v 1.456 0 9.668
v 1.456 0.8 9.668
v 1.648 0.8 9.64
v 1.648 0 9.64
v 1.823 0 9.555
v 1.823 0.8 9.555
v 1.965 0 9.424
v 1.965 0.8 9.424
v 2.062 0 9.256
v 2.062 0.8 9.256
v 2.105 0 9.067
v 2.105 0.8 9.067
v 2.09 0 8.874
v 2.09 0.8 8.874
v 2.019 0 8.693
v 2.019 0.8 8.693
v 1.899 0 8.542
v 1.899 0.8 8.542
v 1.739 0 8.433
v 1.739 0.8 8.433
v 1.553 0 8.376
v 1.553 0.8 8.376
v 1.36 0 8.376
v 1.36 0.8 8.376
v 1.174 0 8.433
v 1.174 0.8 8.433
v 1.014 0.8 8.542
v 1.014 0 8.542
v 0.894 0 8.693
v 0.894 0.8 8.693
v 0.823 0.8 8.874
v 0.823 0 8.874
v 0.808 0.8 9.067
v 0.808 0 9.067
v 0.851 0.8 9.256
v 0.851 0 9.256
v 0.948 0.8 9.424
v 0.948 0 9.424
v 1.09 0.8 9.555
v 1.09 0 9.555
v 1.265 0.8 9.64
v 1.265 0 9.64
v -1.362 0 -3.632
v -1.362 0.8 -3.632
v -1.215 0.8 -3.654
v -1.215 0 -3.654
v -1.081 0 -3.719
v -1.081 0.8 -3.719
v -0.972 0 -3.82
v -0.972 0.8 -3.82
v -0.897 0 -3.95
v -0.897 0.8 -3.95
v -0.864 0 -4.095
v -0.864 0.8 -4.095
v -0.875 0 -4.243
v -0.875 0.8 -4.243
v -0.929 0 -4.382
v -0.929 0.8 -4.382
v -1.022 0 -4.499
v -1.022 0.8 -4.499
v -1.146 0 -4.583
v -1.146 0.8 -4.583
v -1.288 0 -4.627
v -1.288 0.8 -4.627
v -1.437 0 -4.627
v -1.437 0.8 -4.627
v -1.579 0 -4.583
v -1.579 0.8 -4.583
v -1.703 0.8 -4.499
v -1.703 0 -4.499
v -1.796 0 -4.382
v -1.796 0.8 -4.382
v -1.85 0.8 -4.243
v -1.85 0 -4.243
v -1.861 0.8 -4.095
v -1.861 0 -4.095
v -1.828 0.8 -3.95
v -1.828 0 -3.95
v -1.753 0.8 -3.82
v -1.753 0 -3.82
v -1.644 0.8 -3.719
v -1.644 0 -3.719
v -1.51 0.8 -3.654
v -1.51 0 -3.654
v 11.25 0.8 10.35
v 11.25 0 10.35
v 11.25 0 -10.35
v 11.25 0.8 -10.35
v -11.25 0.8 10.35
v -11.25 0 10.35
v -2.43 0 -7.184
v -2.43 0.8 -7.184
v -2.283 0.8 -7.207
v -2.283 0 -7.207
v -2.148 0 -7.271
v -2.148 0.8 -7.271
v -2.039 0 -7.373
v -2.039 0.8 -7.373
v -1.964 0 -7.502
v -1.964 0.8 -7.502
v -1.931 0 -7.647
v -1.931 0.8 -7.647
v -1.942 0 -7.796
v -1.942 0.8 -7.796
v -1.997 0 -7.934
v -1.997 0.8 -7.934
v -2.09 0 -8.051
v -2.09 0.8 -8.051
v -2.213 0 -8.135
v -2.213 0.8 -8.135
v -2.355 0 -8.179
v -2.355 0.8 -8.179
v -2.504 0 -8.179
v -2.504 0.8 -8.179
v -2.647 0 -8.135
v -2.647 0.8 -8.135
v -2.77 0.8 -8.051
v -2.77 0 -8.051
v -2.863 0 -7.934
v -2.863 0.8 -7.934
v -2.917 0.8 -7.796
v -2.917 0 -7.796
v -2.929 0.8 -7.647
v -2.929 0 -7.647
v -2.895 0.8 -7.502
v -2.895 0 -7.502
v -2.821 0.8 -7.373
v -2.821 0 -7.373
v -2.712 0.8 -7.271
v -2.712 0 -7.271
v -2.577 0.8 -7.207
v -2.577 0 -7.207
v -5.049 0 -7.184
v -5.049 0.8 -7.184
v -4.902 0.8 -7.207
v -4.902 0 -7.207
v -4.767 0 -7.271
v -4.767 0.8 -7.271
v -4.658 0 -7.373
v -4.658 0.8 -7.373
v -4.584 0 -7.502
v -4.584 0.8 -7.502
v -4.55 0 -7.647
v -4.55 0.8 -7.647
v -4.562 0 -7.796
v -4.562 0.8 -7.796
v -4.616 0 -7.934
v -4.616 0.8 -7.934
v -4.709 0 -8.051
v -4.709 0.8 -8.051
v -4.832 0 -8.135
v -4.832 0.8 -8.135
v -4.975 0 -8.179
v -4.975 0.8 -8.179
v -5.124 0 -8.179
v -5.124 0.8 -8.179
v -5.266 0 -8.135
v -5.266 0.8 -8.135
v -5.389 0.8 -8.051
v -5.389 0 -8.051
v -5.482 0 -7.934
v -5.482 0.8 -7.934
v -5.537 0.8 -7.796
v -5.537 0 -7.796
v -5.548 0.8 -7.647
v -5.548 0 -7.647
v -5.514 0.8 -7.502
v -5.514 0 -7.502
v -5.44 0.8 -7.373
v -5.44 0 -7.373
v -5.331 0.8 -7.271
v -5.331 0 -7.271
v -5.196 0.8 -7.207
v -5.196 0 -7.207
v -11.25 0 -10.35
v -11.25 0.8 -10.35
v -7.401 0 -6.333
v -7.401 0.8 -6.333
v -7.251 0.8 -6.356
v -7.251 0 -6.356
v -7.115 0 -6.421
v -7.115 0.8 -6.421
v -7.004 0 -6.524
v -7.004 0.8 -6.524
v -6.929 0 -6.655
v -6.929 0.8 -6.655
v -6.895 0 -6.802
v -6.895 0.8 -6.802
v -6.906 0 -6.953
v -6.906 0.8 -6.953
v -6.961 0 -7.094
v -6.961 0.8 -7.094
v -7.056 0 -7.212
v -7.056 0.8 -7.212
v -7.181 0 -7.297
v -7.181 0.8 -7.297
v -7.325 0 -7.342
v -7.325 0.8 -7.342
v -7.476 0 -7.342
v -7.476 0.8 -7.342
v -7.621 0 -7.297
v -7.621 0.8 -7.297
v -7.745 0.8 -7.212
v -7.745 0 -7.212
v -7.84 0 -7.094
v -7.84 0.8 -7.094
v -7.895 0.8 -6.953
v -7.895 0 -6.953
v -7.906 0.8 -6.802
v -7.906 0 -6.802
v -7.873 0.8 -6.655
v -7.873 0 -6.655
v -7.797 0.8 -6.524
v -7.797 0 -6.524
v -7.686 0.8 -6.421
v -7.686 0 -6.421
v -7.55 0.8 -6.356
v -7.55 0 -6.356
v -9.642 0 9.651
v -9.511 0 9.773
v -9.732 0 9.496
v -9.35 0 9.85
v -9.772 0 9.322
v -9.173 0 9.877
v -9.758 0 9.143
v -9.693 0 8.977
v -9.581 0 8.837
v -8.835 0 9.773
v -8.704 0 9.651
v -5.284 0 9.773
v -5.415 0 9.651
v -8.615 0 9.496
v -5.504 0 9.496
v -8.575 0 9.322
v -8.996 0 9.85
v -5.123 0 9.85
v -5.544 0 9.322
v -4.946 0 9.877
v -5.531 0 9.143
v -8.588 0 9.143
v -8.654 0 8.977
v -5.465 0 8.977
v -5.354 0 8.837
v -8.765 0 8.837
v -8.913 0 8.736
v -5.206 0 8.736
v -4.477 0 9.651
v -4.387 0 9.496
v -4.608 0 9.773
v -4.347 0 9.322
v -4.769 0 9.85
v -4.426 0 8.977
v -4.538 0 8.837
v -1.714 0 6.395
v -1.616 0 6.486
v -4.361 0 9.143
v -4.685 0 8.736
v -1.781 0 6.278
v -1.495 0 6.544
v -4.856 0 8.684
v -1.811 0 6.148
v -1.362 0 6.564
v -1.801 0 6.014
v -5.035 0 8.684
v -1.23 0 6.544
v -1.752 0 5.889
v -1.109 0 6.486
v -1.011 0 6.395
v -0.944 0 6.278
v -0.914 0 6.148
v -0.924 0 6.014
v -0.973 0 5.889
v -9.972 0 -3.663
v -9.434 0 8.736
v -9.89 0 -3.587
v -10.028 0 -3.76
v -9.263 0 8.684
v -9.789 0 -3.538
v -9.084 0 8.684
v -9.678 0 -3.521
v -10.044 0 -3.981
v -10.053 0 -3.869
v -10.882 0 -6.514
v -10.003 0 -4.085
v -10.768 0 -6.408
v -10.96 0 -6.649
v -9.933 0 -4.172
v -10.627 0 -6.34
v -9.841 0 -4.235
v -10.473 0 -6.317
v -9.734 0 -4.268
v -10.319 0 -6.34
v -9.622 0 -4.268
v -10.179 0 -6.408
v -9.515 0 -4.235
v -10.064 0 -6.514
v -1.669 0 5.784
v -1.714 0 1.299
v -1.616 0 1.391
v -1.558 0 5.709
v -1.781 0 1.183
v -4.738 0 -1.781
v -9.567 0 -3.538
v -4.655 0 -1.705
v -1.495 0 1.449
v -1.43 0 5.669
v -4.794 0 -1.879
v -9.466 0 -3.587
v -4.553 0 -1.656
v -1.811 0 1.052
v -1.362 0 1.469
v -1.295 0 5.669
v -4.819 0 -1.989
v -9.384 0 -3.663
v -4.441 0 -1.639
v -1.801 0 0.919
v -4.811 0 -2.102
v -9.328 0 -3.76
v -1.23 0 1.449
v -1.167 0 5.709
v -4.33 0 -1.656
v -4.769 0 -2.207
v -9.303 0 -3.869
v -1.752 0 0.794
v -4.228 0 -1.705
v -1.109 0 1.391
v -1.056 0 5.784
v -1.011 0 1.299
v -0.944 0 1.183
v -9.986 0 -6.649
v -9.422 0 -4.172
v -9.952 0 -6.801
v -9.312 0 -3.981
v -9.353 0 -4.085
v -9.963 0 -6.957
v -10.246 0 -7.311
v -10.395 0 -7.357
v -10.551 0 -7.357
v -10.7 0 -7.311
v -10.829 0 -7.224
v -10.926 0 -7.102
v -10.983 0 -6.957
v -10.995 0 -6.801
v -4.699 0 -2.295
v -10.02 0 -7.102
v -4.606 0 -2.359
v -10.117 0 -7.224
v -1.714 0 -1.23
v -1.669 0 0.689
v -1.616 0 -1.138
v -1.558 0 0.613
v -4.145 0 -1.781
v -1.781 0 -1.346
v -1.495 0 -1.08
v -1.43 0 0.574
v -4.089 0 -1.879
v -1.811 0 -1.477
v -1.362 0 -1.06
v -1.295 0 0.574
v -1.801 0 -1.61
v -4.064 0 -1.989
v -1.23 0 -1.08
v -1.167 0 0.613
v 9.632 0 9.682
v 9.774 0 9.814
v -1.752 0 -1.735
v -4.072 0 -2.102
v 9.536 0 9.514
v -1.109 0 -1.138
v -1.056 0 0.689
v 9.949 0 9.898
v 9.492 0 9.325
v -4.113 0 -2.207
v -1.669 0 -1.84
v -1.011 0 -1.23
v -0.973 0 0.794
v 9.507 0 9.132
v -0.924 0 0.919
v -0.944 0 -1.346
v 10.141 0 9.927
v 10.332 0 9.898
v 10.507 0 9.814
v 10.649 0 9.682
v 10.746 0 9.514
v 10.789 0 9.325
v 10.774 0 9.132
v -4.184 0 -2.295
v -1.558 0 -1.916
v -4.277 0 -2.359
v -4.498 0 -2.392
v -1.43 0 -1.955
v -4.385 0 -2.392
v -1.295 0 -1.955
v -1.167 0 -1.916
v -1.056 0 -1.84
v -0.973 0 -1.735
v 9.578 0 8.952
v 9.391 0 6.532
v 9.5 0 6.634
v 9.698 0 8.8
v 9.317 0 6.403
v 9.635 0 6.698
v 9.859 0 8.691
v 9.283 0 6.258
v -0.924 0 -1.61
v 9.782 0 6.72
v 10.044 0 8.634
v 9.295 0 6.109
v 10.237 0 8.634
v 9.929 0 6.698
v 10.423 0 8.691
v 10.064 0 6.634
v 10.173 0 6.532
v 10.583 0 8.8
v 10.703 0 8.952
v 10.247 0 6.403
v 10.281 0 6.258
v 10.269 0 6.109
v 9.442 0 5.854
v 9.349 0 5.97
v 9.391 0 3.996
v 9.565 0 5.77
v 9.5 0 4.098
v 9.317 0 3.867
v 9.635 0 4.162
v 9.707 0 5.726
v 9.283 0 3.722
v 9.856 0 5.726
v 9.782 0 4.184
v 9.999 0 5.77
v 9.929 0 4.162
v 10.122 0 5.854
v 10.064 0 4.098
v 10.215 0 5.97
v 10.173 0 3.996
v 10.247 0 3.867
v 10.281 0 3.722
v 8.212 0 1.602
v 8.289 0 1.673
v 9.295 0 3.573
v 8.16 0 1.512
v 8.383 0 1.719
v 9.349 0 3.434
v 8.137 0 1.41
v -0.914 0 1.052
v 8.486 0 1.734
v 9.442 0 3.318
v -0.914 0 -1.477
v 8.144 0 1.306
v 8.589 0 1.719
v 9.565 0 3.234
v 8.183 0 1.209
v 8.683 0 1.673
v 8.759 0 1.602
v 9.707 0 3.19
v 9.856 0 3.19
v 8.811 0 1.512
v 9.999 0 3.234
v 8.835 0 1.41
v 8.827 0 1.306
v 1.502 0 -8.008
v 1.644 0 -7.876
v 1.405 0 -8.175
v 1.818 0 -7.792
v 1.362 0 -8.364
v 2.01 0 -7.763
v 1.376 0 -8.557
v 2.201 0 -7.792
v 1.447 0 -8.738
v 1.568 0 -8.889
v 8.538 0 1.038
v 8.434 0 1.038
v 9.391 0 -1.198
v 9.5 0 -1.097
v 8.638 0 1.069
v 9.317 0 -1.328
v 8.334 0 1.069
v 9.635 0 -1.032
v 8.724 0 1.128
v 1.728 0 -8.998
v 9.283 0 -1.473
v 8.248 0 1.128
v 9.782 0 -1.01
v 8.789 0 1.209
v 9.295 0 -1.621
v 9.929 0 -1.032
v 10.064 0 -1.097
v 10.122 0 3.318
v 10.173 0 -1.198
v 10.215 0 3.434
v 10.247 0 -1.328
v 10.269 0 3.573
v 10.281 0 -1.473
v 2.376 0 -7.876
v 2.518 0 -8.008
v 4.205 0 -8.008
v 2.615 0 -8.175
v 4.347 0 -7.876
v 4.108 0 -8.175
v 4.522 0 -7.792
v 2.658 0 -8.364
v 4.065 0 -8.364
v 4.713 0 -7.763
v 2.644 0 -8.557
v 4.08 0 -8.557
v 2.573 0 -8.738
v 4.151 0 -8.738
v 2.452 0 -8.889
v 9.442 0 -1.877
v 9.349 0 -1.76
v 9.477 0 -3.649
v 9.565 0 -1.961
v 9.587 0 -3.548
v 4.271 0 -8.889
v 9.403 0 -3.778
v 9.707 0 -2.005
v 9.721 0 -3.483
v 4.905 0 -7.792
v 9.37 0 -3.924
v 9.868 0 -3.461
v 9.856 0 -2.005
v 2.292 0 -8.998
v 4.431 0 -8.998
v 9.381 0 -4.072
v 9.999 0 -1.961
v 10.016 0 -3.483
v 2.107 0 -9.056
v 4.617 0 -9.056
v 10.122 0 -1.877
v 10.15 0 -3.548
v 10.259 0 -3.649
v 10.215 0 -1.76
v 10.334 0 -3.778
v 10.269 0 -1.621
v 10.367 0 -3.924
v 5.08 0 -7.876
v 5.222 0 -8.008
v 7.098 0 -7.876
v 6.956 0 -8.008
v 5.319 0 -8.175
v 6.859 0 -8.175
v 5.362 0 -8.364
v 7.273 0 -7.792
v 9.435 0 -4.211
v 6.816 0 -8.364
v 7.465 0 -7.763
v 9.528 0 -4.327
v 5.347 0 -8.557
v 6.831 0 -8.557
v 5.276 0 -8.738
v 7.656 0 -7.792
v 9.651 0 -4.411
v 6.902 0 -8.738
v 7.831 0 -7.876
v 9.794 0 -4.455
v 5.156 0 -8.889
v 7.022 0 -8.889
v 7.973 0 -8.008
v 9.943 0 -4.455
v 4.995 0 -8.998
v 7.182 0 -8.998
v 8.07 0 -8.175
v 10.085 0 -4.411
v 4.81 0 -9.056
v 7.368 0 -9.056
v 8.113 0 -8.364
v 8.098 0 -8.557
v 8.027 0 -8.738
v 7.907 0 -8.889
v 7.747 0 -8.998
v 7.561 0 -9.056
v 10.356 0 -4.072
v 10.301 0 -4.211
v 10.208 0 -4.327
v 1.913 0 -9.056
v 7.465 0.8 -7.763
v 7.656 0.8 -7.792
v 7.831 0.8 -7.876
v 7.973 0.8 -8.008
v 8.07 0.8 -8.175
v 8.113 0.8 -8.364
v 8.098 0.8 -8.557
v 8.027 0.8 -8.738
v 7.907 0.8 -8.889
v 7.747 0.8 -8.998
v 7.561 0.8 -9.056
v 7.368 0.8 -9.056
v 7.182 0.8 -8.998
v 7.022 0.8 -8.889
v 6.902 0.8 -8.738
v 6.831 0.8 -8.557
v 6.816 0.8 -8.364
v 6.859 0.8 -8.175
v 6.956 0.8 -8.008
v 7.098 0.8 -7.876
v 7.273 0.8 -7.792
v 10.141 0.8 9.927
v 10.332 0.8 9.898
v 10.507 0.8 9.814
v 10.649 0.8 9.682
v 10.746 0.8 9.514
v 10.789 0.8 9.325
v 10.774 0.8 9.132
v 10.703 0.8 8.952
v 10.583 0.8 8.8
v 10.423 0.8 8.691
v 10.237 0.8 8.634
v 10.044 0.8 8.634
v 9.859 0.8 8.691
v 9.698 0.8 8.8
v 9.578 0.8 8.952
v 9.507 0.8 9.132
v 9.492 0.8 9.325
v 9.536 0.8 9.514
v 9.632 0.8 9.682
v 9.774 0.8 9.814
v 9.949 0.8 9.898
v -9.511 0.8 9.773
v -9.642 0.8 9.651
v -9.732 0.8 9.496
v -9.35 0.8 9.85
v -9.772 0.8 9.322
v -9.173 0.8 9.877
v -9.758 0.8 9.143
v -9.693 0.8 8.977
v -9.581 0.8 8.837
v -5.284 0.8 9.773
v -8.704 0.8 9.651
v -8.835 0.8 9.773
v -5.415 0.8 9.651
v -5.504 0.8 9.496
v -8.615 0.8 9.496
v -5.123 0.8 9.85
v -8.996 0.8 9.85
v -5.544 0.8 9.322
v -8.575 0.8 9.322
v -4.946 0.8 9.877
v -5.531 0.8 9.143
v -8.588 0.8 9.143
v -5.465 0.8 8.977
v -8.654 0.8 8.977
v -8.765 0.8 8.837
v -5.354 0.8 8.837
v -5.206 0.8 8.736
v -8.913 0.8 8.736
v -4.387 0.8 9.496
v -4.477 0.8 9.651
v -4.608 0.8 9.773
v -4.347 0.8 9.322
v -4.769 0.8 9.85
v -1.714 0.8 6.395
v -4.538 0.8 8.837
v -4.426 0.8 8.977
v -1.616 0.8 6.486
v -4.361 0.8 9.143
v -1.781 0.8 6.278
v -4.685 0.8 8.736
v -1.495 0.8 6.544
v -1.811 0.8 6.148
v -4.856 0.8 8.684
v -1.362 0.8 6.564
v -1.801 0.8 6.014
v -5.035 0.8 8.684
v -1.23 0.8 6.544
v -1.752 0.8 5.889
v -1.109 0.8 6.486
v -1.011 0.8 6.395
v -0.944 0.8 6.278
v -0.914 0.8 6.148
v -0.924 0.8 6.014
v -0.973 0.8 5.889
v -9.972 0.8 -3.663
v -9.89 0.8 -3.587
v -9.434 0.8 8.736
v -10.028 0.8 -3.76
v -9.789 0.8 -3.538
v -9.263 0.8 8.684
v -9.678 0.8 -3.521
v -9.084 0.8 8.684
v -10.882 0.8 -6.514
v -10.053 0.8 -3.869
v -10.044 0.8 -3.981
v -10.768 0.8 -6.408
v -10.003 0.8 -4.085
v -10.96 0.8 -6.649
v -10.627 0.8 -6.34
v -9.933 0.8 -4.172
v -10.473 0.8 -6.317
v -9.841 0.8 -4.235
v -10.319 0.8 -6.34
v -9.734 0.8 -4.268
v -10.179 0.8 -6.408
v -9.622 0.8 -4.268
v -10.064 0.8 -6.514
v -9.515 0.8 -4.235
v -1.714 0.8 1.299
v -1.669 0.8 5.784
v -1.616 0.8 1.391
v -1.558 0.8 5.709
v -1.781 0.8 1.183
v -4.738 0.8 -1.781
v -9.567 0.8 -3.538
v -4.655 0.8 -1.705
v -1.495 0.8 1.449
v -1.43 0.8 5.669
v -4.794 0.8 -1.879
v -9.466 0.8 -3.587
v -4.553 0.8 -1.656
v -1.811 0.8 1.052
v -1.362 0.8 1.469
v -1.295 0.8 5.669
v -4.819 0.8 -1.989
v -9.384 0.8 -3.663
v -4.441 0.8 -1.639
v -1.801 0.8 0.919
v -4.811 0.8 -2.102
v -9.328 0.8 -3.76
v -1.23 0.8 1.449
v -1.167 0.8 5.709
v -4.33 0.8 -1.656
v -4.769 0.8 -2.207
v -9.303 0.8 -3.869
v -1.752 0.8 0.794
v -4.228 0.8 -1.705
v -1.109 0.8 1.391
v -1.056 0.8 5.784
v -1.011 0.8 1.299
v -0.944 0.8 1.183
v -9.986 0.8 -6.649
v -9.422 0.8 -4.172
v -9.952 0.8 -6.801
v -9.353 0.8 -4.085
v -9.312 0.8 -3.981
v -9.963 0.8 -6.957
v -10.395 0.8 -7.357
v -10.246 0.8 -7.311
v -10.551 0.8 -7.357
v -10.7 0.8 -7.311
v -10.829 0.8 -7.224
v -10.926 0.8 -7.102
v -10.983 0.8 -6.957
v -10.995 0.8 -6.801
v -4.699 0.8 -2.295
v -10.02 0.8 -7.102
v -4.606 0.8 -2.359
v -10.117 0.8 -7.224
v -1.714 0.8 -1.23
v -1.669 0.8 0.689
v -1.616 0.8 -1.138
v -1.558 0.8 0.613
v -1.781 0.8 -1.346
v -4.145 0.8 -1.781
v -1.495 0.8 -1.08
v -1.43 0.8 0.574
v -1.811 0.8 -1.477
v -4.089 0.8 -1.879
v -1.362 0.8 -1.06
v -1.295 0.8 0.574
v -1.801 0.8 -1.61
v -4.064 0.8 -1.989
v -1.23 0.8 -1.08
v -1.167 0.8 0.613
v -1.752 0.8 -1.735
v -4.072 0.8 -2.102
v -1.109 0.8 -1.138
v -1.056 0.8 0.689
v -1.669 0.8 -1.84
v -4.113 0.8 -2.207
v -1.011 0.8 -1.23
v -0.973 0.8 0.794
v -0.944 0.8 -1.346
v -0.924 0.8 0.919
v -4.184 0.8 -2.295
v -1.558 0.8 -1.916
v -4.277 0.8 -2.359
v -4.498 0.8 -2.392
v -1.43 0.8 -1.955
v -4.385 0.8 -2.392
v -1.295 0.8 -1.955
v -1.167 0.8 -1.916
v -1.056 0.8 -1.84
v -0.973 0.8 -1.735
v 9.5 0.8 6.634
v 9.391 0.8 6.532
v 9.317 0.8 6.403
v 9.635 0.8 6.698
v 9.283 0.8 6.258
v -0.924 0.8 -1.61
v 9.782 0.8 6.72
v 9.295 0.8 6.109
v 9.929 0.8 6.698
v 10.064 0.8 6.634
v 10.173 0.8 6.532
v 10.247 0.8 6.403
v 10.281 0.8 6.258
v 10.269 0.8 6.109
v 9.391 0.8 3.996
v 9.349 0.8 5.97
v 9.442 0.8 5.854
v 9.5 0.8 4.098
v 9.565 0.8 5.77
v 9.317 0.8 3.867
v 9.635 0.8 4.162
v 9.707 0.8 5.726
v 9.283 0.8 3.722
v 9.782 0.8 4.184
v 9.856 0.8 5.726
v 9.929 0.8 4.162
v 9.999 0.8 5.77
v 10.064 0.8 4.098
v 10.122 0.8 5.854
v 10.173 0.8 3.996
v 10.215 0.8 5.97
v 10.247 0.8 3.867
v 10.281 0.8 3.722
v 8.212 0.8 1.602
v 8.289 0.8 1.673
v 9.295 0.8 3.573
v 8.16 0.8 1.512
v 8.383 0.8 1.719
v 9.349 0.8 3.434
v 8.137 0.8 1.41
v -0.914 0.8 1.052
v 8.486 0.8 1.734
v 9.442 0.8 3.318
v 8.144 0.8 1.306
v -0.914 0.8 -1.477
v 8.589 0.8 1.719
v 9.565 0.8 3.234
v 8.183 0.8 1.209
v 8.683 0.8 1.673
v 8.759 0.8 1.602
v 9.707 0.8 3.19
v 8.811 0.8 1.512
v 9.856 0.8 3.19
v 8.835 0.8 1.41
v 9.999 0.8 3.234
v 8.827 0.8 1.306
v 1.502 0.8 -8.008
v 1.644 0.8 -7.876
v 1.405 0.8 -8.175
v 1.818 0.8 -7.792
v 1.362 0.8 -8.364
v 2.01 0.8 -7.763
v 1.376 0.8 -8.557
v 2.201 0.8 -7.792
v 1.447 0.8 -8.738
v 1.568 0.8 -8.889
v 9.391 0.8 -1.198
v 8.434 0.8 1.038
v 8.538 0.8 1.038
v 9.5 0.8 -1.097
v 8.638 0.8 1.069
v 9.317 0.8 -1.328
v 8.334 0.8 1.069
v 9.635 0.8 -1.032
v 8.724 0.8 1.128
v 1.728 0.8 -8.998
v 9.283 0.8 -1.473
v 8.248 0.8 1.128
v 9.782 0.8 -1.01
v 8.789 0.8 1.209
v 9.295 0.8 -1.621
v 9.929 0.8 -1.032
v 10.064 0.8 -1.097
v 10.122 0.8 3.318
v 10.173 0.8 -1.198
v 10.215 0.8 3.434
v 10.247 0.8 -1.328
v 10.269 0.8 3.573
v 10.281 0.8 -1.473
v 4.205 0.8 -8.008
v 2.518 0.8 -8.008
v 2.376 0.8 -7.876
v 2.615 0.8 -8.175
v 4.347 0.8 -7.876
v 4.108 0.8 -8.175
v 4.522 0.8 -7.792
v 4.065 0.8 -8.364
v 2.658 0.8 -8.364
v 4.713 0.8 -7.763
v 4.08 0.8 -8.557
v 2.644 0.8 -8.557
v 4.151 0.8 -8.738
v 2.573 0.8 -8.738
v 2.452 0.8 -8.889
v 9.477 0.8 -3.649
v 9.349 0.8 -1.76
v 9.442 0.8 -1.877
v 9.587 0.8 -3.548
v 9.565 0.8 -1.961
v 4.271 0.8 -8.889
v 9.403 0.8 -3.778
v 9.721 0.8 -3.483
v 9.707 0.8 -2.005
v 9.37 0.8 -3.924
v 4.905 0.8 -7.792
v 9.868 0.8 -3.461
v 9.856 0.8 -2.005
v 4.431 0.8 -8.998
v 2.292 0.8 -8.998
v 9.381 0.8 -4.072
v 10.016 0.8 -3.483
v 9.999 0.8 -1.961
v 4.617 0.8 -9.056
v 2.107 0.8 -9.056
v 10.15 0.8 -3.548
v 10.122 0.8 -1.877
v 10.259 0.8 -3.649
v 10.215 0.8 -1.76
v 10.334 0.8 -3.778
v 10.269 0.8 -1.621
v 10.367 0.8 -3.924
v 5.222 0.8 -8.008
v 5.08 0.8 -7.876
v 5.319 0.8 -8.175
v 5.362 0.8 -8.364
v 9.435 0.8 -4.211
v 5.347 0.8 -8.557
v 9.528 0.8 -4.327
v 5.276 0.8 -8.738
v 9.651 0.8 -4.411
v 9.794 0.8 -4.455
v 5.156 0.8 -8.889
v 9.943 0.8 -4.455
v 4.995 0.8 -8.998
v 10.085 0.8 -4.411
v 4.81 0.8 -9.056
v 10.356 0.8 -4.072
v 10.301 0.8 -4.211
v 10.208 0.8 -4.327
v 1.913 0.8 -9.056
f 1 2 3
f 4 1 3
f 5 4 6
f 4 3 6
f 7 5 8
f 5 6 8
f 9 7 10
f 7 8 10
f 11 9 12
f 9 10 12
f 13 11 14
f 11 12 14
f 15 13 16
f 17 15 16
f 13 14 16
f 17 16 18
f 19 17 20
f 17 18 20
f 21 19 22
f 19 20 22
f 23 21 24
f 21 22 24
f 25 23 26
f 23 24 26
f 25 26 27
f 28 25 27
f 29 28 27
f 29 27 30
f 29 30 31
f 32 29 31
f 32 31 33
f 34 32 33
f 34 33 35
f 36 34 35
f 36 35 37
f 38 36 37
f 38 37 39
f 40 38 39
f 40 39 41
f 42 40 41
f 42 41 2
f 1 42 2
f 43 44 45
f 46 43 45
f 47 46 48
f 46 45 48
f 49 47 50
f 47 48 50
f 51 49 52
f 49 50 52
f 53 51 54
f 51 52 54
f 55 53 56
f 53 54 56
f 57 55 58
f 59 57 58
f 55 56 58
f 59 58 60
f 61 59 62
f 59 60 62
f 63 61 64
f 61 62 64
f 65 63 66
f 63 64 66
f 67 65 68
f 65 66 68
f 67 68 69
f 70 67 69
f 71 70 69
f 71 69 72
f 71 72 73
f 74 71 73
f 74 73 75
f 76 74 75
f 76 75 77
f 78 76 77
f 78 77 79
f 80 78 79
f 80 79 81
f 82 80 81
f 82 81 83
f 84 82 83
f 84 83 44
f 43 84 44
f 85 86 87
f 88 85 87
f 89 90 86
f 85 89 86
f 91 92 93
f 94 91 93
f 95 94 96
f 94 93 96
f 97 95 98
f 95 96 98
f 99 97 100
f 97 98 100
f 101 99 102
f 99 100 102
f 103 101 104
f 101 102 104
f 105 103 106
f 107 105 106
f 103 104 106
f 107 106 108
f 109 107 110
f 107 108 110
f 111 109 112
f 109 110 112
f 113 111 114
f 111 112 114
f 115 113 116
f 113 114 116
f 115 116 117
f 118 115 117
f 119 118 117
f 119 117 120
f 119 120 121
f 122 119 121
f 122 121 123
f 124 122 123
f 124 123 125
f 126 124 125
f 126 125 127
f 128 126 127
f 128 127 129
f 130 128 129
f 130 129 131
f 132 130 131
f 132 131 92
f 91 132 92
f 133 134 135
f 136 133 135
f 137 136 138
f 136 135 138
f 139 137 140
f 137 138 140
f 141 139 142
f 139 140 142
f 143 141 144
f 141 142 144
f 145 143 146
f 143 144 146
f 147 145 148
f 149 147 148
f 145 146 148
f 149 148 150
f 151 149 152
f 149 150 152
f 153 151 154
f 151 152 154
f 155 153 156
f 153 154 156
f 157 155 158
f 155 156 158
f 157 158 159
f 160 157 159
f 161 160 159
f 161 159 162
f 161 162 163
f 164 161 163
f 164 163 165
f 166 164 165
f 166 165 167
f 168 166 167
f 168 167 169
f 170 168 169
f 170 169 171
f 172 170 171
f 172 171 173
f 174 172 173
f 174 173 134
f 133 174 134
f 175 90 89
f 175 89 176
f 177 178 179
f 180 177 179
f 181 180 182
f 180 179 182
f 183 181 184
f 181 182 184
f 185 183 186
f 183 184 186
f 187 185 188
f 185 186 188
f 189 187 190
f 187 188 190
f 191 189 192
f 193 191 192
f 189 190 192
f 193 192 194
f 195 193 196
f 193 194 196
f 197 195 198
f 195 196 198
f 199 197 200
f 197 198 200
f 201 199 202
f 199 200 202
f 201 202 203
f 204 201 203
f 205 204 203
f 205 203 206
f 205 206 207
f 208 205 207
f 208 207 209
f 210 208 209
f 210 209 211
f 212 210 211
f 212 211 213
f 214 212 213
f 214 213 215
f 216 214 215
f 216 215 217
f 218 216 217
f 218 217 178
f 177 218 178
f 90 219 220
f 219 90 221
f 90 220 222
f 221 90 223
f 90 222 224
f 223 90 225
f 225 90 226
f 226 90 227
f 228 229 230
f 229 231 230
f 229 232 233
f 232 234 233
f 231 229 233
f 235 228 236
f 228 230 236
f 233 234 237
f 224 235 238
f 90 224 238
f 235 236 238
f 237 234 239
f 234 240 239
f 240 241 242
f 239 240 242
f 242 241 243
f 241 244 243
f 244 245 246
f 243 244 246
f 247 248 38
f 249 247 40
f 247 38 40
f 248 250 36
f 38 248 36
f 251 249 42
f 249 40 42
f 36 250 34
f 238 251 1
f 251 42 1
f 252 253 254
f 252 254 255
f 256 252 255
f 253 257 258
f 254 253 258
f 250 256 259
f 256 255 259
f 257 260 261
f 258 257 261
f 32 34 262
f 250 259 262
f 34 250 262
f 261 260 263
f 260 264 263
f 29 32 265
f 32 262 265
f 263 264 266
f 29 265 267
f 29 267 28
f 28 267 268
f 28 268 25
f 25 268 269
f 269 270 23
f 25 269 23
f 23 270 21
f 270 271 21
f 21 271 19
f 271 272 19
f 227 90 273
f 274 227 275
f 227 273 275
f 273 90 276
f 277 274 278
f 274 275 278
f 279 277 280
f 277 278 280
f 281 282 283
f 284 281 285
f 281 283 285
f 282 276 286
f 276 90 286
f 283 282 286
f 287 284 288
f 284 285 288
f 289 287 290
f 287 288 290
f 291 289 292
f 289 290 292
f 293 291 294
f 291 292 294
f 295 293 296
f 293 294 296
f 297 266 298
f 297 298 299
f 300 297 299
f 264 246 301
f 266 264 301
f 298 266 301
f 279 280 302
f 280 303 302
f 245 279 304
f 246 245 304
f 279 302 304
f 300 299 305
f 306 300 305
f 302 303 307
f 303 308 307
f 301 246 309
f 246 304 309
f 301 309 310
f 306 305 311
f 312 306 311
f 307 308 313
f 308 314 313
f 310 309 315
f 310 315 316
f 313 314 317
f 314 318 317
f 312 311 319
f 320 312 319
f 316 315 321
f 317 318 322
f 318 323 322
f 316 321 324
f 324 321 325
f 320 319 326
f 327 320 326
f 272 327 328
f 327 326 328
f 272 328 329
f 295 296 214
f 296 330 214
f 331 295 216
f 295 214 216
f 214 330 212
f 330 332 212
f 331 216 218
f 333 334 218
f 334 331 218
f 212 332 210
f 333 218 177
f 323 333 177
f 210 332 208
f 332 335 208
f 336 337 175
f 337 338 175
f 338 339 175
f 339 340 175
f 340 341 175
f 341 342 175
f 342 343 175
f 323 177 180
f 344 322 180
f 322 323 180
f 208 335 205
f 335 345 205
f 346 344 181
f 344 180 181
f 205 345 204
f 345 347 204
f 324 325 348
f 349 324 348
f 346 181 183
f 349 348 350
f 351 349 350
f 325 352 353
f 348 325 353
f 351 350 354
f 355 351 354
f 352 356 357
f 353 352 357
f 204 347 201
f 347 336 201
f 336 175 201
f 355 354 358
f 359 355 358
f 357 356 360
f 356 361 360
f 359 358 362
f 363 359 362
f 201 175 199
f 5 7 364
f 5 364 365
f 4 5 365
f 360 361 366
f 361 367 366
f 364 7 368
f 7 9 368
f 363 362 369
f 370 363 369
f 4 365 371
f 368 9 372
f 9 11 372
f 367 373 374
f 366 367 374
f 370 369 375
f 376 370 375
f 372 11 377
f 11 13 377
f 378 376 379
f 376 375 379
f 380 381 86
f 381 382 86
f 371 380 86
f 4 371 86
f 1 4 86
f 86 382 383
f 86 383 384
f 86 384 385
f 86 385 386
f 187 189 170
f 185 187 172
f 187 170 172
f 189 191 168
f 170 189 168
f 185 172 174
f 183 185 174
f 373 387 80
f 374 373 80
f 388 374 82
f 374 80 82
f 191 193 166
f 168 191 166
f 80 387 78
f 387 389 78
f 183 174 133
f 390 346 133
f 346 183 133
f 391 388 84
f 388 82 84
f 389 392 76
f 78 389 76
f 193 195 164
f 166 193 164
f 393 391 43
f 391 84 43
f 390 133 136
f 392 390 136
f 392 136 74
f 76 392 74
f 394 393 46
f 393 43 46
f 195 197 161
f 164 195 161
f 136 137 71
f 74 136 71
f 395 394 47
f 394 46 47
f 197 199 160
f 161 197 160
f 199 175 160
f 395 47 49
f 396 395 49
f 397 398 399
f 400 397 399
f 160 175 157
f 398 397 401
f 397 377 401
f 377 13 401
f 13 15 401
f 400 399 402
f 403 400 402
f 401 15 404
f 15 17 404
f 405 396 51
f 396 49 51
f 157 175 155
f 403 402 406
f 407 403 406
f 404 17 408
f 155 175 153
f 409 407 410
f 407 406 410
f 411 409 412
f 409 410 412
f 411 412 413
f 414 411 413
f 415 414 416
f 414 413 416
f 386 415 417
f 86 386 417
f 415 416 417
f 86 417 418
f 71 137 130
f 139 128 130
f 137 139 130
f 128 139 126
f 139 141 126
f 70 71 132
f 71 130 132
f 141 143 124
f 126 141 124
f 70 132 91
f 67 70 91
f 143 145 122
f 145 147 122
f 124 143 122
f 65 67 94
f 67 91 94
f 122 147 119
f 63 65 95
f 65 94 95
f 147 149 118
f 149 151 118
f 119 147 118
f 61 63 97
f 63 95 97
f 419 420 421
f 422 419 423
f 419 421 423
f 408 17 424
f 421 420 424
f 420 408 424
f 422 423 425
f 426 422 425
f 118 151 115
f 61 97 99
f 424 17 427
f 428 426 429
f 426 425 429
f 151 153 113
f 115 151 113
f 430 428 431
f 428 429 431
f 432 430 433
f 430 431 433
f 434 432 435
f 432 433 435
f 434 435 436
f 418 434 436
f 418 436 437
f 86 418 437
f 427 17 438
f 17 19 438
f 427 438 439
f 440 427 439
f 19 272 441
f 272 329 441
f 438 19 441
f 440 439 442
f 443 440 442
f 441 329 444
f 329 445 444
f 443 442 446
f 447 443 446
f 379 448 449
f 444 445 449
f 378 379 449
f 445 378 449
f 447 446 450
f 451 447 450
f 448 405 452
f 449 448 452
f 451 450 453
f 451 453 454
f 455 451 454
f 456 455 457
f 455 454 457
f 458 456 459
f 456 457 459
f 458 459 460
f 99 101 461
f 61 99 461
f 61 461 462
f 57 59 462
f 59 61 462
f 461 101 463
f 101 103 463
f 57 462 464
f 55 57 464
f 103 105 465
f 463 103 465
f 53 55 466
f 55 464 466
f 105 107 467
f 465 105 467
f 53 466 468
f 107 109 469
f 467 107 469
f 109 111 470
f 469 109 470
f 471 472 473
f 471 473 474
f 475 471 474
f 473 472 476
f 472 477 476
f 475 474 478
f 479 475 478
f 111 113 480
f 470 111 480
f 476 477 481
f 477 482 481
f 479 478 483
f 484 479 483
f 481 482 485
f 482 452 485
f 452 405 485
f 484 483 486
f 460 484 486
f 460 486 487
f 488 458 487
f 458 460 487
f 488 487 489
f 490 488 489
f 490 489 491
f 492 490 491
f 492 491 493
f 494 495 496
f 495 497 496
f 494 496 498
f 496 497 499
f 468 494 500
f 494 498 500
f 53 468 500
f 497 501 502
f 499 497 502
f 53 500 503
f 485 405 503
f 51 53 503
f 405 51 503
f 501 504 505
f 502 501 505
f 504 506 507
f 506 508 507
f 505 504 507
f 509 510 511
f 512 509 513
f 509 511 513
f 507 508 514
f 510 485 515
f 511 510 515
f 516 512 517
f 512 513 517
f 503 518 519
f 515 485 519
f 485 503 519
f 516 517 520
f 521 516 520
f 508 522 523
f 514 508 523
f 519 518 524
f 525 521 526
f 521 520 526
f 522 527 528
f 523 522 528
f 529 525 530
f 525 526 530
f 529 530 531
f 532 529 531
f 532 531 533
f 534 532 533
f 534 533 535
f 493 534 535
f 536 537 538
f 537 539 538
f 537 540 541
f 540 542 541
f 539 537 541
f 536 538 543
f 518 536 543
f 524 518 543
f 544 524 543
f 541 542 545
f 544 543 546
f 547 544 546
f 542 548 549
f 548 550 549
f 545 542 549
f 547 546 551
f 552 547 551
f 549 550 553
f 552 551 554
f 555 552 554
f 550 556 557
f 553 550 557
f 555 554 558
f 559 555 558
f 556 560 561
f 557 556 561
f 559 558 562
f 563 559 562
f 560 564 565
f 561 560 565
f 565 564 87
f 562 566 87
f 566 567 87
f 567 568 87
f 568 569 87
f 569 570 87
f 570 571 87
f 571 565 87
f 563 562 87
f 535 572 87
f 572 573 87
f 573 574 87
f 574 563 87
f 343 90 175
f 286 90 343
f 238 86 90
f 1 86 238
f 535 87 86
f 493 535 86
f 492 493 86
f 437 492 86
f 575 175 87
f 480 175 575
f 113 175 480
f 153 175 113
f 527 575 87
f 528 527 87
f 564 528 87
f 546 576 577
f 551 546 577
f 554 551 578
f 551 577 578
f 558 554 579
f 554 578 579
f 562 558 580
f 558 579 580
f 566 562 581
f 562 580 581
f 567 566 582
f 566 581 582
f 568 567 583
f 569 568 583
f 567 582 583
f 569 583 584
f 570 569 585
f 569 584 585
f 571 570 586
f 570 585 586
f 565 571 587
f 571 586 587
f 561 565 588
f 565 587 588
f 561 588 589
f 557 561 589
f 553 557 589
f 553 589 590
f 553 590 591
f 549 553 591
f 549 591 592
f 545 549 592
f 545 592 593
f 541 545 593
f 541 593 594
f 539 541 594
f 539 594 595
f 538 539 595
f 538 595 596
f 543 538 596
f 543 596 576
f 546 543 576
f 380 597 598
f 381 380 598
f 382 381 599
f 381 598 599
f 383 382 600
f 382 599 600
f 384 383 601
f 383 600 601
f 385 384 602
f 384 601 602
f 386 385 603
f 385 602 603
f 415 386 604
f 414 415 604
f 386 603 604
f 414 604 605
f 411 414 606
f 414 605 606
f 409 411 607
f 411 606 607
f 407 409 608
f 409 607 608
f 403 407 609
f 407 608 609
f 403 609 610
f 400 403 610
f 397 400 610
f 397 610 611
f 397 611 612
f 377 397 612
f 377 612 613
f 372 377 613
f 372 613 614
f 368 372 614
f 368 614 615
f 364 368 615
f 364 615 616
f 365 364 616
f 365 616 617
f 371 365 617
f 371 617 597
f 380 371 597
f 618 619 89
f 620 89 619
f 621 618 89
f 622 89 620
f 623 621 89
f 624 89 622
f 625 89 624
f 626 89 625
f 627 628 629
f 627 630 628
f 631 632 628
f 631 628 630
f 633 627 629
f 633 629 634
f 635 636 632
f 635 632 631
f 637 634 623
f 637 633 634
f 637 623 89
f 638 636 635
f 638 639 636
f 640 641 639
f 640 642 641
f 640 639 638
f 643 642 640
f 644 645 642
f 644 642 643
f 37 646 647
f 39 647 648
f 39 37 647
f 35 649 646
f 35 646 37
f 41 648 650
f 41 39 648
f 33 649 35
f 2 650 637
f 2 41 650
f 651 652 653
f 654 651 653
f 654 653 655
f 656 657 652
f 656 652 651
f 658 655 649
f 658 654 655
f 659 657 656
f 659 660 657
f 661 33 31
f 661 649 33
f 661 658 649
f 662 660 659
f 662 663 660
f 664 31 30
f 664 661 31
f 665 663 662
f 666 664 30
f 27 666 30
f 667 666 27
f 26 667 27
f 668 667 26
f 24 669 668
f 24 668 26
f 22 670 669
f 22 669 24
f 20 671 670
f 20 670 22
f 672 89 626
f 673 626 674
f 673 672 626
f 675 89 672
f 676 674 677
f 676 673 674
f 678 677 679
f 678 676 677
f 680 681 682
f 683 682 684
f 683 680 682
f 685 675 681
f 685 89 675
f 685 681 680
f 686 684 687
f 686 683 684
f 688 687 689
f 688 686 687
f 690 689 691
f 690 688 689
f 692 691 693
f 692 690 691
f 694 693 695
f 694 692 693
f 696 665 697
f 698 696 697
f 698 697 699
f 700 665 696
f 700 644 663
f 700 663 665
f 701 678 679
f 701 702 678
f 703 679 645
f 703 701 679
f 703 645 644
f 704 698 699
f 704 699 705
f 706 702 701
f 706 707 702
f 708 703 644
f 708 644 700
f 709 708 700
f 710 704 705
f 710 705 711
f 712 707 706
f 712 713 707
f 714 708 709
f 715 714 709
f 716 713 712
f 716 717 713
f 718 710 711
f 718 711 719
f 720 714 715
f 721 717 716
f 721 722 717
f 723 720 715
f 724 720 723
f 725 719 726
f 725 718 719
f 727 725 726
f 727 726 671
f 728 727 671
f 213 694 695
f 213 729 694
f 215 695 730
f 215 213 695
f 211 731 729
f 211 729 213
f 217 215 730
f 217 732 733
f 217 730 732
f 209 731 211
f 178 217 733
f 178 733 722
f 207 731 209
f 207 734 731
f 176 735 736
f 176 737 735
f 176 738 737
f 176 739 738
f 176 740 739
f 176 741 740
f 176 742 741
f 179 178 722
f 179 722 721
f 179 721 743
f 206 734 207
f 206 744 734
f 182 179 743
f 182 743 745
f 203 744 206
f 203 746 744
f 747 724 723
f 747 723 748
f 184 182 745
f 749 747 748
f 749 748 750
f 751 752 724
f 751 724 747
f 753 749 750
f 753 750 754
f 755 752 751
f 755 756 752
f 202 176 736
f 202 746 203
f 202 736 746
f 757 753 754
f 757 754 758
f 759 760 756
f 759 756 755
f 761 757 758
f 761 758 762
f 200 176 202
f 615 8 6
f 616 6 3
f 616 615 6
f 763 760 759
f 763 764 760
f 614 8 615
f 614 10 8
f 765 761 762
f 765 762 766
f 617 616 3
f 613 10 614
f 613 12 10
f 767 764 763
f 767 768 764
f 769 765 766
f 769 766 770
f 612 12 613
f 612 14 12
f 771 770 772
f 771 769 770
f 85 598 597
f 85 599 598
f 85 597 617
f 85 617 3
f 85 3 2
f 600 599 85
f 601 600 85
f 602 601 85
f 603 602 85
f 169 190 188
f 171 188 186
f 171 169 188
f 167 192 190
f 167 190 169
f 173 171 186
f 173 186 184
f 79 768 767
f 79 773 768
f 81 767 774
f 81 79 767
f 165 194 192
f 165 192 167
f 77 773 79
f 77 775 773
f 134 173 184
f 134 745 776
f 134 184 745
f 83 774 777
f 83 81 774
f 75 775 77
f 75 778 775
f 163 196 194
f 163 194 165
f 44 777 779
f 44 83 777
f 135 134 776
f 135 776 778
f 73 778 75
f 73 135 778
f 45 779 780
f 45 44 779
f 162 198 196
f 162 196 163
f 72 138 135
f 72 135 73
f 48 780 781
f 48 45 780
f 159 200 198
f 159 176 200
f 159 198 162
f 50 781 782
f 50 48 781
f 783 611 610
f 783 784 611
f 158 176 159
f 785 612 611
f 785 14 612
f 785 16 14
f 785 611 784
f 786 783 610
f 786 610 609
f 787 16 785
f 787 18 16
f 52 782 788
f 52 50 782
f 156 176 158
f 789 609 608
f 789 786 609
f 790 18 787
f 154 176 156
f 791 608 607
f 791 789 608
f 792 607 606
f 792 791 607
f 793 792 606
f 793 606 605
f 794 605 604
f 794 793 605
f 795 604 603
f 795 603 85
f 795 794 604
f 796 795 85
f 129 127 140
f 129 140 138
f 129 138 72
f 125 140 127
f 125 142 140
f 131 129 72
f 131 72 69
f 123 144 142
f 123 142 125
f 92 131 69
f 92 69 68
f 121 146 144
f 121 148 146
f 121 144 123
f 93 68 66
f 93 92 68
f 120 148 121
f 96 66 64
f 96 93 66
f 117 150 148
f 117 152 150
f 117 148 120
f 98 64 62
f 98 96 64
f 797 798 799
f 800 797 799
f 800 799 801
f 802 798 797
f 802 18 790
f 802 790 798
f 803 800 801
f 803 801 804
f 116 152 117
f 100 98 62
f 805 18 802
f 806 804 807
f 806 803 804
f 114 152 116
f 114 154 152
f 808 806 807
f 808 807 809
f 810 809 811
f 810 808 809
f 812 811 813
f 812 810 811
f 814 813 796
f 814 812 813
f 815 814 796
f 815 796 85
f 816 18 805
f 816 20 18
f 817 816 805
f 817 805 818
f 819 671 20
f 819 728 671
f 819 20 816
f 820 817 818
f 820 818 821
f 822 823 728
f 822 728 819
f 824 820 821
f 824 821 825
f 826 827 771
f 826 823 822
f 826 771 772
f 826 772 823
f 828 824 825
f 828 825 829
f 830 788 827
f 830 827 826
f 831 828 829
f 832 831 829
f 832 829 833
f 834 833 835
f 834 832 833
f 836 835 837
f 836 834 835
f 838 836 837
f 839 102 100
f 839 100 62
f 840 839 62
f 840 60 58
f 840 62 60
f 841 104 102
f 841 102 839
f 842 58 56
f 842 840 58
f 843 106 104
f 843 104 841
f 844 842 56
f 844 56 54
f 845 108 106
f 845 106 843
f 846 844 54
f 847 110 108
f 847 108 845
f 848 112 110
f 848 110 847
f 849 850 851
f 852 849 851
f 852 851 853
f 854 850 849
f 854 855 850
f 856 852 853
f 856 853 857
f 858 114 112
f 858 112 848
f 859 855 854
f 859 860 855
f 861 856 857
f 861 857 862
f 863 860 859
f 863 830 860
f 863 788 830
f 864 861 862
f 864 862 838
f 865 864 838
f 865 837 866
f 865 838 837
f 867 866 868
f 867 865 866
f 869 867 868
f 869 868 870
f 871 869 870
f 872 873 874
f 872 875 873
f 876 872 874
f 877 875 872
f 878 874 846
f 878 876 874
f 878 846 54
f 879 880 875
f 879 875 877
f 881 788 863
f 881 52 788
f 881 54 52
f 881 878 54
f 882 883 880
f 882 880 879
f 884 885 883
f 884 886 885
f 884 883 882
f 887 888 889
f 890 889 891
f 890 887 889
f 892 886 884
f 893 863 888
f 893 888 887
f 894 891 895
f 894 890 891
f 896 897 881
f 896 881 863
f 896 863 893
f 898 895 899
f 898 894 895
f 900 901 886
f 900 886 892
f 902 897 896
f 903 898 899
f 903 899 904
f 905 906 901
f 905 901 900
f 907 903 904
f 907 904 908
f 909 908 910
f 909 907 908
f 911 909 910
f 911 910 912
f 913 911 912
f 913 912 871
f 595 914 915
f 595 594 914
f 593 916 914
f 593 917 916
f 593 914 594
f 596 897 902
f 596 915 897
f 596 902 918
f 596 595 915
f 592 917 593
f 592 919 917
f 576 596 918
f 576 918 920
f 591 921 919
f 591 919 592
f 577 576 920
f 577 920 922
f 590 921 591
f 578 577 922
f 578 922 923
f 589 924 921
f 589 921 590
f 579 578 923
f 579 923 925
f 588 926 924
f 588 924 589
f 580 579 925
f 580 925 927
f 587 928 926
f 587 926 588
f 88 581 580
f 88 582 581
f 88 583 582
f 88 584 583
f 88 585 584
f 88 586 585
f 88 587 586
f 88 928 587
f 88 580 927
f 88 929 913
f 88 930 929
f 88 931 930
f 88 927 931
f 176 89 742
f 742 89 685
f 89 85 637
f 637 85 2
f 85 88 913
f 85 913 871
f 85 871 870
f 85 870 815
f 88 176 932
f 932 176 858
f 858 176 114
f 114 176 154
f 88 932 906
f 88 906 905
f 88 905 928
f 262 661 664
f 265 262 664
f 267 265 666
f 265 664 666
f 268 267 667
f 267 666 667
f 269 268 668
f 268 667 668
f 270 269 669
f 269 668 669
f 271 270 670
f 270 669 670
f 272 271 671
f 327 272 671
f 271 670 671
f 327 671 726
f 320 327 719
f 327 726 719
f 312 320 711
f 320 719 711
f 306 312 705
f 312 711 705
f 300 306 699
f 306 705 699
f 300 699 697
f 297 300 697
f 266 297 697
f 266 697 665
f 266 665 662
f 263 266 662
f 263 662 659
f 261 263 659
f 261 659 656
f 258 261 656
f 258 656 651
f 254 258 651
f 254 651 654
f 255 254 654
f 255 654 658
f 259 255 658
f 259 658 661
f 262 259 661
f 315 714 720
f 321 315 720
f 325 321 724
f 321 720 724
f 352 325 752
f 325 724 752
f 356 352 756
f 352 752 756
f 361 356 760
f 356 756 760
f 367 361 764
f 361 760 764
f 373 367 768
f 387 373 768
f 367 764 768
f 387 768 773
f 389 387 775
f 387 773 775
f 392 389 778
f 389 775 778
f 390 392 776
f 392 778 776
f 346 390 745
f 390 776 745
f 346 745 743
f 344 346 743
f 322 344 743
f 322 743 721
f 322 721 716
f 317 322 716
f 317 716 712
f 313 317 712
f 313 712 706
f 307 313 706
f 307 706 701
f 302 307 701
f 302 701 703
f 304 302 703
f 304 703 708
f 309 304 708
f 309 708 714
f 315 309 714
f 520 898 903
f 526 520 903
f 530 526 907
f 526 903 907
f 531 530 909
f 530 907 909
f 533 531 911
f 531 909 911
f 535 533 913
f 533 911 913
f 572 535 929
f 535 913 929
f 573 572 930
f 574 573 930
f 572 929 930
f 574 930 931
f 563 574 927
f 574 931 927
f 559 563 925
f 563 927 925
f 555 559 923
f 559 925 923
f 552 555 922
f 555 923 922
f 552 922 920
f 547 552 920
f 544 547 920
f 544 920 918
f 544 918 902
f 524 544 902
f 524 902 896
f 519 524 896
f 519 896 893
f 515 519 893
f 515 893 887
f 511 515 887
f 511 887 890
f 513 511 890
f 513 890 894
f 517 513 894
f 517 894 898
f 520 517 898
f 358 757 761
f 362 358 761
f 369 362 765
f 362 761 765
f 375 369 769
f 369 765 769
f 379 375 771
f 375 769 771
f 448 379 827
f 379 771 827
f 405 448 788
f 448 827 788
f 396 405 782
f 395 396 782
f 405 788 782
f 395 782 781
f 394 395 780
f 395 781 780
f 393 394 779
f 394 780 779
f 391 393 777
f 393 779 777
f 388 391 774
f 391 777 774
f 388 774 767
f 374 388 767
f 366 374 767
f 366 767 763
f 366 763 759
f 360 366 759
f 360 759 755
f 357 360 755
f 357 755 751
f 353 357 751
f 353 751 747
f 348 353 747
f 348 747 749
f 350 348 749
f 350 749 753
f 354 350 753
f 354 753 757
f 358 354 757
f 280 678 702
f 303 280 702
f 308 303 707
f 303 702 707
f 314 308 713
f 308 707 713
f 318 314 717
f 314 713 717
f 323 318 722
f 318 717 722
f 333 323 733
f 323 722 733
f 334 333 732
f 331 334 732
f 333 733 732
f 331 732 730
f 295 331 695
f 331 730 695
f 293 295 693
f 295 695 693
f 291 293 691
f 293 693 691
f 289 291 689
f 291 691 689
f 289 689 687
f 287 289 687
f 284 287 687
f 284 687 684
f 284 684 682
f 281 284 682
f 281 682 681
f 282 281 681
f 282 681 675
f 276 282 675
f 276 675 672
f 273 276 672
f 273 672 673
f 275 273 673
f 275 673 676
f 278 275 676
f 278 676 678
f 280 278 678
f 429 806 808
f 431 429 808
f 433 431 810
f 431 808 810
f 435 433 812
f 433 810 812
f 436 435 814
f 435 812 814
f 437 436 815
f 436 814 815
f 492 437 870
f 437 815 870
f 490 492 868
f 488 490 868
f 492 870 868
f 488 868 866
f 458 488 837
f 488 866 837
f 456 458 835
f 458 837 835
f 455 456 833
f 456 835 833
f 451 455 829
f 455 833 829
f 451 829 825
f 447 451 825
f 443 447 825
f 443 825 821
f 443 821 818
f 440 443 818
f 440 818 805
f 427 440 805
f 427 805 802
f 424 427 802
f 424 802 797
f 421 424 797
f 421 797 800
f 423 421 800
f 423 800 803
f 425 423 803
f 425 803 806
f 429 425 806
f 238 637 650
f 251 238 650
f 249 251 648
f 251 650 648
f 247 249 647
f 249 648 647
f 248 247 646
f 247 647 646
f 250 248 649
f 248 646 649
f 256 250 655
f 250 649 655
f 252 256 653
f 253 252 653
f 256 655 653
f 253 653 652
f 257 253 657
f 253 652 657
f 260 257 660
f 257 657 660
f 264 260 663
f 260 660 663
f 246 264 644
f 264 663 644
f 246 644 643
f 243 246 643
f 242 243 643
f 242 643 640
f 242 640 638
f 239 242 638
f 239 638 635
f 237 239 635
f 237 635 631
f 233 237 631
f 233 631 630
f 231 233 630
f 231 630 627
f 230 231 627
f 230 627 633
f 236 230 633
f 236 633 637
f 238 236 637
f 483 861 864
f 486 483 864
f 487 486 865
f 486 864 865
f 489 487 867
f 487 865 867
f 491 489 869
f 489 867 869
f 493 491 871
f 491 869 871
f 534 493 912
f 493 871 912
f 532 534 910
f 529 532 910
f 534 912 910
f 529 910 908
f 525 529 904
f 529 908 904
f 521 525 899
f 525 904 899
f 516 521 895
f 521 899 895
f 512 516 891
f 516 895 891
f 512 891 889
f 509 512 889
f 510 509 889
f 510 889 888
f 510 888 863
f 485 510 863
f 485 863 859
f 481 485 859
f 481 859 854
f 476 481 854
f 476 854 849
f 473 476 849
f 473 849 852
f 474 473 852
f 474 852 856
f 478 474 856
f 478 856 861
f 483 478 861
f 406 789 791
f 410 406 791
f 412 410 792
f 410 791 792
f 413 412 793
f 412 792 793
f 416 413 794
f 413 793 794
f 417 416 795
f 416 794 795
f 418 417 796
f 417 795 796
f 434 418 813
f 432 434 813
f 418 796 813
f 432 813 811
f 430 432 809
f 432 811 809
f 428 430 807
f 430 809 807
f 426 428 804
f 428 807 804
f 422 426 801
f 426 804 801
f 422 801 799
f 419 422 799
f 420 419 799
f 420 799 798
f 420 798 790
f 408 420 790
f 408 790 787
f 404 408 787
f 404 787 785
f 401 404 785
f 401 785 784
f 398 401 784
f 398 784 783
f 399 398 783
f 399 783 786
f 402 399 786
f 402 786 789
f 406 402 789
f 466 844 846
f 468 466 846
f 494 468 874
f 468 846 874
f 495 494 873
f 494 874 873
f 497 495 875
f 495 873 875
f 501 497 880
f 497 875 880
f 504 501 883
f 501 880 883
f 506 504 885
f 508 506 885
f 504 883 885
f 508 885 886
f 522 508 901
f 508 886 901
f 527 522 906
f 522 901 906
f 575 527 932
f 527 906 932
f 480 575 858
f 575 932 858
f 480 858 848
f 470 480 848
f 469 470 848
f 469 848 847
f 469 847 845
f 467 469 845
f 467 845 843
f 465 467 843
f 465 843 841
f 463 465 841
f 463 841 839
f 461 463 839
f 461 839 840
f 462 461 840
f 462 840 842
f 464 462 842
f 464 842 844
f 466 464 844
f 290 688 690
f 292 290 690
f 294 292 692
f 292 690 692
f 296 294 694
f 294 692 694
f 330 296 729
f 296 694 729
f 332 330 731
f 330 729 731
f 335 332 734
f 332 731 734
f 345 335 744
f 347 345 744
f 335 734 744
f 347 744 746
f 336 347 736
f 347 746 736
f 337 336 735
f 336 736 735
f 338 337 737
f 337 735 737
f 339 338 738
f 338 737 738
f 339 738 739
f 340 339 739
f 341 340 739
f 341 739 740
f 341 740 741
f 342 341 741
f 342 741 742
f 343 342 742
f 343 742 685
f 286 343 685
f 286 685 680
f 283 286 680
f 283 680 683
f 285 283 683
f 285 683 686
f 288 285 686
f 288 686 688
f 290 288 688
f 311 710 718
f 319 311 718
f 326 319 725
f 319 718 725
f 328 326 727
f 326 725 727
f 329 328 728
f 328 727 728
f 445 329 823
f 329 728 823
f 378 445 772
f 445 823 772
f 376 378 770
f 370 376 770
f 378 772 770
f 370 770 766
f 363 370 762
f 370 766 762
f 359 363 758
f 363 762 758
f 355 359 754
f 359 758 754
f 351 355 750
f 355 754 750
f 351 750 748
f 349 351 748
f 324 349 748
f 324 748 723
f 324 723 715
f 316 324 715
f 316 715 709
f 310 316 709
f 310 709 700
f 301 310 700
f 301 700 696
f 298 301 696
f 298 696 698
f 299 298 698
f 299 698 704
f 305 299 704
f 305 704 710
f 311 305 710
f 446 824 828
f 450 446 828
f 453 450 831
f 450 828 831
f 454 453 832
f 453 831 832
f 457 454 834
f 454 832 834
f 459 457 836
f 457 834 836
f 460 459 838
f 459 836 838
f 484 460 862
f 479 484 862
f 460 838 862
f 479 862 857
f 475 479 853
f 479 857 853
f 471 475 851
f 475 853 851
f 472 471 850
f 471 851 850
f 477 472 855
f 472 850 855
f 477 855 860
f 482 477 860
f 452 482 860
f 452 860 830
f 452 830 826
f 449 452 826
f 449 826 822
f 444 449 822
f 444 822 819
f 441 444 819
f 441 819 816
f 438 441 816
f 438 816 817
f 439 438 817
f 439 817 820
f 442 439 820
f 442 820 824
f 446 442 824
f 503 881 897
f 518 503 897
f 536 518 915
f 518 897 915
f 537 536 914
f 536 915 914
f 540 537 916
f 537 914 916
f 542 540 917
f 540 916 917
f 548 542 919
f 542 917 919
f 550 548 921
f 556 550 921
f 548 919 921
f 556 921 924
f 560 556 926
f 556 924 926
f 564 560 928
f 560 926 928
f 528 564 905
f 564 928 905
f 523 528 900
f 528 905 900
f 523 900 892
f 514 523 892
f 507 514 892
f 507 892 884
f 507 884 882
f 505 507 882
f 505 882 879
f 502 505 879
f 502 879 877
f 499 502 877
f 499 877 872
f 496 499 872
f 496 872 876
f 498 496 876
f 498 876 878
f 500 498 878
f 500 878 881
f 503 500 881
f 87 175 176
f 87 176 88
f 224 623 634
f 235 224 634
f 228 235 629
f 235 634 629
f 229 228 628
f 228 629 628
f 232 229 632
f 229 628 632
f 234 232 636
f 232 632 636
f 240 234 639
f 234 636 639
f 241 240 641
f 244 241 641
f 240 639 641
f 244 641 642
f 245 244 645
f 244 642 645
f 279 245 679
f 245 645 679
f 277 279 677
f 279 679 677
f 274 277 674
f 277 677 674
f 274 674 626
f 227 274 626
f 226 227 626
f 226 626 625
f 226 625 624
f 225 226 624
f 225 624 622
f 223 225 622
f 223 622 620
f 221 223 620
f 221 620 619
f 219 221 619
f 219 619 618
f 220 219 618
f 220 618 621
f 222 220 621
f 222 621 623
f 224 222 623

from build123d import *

# Parameters (mm, degrees)
ESBO_O1_W                = 22.5
ESBO_O1_H                = 20.7
RESSALTO_EXTRUS_O1_DEPTH = 0.8
ESBO_O2_R                = 0.5
ESBO_O2_R_2              = 0.65
ESBO_O2_R_3              = 0.45
ESBO_O2_R_4              = 0.507049464
ESBO_O2_R_5              = 0.6
ESBO_O2_R_6              = 0.375708805
ESBO_O2_R_7              = 0.378805018
ESBO_O2_R_8              = 0.350015613
ESBO_O2_R_9              = 0.522974081
CORTE_EXTRUS_O1_DEPTH    = 2


with BuildPart() as part:
    # Esboço1 → Ressalto-extrusão1 (new body)
    with BuildSketch(Plane(origin=(0, 0, 0), x_dir=(1, 0, 0), z_dir=(0, 1, 0))):
        Rectangle(ESBO_O1_W, ESBO_O1_H)
    extrude(amount=RESSALTO_EXTRUS_O1_DEPTH)

    # Esboço2 → Corte-extrusão1 (cut)
    with BuildSketch(Plane(origin=(0, 0.8, 0), x_dir=(1, 0, 0), z_dir=(0, 1, 0))):
        with Locations(Location((-1.362497423, 4.13217589, 0), (0, 0, 270))):
            Circle(ESBO_O2_R)
        with Locations(Location((9.781964431, 1.510174659, 0), (0, 0, 270))):
            Circle(ESBO_O2_R)
        with Locations(Location((9.781964431, -3.684410863, 0), (0, 0, 270))):
            Circle(ESBO_O2_R)
        with Locations(Location((9.781964431, -6.220381714, 0), (0, 0, 270))):
            Circle(ESBO_O2_R)
        with Locations(Location((10.140573187, -9.276881362, 0), (0, 0, 270))):
            Circle(ESBO_O2_R_2)
        with Locations(Location((1.456478245, -9.018440966, 0), (0, 0, 270))):
            Circle(ESBO_O2_R_2)
        with Locations(Location((-5.049050046, 7.684323928, 0), (0, 0, 270))):
            Circle(ESBO_O2_R)
        with Locations(Location((-2.429917945, 7.684323928, 0), (0, 0, 270))):
            Circle(ESBO_O2_R)
        with Locations(Location((-1.362497423, -6.113976729, 0), (0, 0, 270))):
            Circle(ESBO_O2_R_3)
        with Locations(Location((9.868300548, 3.960954596, 0), (0, 0, 270))):
            Circle(ESBO_O2_R)
        with Locations(Location((-1.362497423, 1.510174659, 0), (0, 0, 270))):
            Circle(ESBO_O2_R_3)
        with Locations(Location((-1.362497423, -1.018750271, 0), (0, 0, 270))):
            Circle(ESBO_O2_R_3)
        with Locations(Location((2.009813707, 8.41282711, 0), (0, 0, 270))):
            Circle(ESBO_O2_R_2)
        with Locations(Location((4.713446832, 8.41282711, 0), (0, 0, 270))):
            Circle(ESBO_O2_R_2)
        with Locations(Location((7.464512117, 8.41282711, 0), (0, 0, 270))):
            Circle(ESBO_O2_R_2)
        with Locations(Location((-7.40057526, 6.840223885, 0), (0, 0, 270))):
            Circle(ESBO_O2_R_4)
        with Locations(Location((-9.173194548, -9.276881362, 0), (0, 0, 270))):
            Circle(ESBO_O2_R_5)
        with Locations(Location((-4.945655629, -9.276881362, 0), (0, 0, 270))):
            Circle(ESBO_O2_R_5)
        with Locations(Location((-9.677939464, 3.896952444, 0), (0, 0, 270))):
            Circle(ESBO_O2_R_6)
        with Locations(Location((-4.441443384, 2.017609351, 0), (0, 0, 270))):
            Circle(ESBO_O2_R_7)
        with Locations(Location((8.485674085, -1.384098552, 0), (0, 0, 270))):
            Circle(ESBO_O2_R_8)
        with Locations(Location((-10.473206437, 6.840223885, 0), (0, 0, 270))):
            Circle(ESBO_O2_R_9)
    extrude(amount=-CORTE_EXTRUS_O1_DEPTH, mode=Mode.SUBTRACT)


solid = part.part
